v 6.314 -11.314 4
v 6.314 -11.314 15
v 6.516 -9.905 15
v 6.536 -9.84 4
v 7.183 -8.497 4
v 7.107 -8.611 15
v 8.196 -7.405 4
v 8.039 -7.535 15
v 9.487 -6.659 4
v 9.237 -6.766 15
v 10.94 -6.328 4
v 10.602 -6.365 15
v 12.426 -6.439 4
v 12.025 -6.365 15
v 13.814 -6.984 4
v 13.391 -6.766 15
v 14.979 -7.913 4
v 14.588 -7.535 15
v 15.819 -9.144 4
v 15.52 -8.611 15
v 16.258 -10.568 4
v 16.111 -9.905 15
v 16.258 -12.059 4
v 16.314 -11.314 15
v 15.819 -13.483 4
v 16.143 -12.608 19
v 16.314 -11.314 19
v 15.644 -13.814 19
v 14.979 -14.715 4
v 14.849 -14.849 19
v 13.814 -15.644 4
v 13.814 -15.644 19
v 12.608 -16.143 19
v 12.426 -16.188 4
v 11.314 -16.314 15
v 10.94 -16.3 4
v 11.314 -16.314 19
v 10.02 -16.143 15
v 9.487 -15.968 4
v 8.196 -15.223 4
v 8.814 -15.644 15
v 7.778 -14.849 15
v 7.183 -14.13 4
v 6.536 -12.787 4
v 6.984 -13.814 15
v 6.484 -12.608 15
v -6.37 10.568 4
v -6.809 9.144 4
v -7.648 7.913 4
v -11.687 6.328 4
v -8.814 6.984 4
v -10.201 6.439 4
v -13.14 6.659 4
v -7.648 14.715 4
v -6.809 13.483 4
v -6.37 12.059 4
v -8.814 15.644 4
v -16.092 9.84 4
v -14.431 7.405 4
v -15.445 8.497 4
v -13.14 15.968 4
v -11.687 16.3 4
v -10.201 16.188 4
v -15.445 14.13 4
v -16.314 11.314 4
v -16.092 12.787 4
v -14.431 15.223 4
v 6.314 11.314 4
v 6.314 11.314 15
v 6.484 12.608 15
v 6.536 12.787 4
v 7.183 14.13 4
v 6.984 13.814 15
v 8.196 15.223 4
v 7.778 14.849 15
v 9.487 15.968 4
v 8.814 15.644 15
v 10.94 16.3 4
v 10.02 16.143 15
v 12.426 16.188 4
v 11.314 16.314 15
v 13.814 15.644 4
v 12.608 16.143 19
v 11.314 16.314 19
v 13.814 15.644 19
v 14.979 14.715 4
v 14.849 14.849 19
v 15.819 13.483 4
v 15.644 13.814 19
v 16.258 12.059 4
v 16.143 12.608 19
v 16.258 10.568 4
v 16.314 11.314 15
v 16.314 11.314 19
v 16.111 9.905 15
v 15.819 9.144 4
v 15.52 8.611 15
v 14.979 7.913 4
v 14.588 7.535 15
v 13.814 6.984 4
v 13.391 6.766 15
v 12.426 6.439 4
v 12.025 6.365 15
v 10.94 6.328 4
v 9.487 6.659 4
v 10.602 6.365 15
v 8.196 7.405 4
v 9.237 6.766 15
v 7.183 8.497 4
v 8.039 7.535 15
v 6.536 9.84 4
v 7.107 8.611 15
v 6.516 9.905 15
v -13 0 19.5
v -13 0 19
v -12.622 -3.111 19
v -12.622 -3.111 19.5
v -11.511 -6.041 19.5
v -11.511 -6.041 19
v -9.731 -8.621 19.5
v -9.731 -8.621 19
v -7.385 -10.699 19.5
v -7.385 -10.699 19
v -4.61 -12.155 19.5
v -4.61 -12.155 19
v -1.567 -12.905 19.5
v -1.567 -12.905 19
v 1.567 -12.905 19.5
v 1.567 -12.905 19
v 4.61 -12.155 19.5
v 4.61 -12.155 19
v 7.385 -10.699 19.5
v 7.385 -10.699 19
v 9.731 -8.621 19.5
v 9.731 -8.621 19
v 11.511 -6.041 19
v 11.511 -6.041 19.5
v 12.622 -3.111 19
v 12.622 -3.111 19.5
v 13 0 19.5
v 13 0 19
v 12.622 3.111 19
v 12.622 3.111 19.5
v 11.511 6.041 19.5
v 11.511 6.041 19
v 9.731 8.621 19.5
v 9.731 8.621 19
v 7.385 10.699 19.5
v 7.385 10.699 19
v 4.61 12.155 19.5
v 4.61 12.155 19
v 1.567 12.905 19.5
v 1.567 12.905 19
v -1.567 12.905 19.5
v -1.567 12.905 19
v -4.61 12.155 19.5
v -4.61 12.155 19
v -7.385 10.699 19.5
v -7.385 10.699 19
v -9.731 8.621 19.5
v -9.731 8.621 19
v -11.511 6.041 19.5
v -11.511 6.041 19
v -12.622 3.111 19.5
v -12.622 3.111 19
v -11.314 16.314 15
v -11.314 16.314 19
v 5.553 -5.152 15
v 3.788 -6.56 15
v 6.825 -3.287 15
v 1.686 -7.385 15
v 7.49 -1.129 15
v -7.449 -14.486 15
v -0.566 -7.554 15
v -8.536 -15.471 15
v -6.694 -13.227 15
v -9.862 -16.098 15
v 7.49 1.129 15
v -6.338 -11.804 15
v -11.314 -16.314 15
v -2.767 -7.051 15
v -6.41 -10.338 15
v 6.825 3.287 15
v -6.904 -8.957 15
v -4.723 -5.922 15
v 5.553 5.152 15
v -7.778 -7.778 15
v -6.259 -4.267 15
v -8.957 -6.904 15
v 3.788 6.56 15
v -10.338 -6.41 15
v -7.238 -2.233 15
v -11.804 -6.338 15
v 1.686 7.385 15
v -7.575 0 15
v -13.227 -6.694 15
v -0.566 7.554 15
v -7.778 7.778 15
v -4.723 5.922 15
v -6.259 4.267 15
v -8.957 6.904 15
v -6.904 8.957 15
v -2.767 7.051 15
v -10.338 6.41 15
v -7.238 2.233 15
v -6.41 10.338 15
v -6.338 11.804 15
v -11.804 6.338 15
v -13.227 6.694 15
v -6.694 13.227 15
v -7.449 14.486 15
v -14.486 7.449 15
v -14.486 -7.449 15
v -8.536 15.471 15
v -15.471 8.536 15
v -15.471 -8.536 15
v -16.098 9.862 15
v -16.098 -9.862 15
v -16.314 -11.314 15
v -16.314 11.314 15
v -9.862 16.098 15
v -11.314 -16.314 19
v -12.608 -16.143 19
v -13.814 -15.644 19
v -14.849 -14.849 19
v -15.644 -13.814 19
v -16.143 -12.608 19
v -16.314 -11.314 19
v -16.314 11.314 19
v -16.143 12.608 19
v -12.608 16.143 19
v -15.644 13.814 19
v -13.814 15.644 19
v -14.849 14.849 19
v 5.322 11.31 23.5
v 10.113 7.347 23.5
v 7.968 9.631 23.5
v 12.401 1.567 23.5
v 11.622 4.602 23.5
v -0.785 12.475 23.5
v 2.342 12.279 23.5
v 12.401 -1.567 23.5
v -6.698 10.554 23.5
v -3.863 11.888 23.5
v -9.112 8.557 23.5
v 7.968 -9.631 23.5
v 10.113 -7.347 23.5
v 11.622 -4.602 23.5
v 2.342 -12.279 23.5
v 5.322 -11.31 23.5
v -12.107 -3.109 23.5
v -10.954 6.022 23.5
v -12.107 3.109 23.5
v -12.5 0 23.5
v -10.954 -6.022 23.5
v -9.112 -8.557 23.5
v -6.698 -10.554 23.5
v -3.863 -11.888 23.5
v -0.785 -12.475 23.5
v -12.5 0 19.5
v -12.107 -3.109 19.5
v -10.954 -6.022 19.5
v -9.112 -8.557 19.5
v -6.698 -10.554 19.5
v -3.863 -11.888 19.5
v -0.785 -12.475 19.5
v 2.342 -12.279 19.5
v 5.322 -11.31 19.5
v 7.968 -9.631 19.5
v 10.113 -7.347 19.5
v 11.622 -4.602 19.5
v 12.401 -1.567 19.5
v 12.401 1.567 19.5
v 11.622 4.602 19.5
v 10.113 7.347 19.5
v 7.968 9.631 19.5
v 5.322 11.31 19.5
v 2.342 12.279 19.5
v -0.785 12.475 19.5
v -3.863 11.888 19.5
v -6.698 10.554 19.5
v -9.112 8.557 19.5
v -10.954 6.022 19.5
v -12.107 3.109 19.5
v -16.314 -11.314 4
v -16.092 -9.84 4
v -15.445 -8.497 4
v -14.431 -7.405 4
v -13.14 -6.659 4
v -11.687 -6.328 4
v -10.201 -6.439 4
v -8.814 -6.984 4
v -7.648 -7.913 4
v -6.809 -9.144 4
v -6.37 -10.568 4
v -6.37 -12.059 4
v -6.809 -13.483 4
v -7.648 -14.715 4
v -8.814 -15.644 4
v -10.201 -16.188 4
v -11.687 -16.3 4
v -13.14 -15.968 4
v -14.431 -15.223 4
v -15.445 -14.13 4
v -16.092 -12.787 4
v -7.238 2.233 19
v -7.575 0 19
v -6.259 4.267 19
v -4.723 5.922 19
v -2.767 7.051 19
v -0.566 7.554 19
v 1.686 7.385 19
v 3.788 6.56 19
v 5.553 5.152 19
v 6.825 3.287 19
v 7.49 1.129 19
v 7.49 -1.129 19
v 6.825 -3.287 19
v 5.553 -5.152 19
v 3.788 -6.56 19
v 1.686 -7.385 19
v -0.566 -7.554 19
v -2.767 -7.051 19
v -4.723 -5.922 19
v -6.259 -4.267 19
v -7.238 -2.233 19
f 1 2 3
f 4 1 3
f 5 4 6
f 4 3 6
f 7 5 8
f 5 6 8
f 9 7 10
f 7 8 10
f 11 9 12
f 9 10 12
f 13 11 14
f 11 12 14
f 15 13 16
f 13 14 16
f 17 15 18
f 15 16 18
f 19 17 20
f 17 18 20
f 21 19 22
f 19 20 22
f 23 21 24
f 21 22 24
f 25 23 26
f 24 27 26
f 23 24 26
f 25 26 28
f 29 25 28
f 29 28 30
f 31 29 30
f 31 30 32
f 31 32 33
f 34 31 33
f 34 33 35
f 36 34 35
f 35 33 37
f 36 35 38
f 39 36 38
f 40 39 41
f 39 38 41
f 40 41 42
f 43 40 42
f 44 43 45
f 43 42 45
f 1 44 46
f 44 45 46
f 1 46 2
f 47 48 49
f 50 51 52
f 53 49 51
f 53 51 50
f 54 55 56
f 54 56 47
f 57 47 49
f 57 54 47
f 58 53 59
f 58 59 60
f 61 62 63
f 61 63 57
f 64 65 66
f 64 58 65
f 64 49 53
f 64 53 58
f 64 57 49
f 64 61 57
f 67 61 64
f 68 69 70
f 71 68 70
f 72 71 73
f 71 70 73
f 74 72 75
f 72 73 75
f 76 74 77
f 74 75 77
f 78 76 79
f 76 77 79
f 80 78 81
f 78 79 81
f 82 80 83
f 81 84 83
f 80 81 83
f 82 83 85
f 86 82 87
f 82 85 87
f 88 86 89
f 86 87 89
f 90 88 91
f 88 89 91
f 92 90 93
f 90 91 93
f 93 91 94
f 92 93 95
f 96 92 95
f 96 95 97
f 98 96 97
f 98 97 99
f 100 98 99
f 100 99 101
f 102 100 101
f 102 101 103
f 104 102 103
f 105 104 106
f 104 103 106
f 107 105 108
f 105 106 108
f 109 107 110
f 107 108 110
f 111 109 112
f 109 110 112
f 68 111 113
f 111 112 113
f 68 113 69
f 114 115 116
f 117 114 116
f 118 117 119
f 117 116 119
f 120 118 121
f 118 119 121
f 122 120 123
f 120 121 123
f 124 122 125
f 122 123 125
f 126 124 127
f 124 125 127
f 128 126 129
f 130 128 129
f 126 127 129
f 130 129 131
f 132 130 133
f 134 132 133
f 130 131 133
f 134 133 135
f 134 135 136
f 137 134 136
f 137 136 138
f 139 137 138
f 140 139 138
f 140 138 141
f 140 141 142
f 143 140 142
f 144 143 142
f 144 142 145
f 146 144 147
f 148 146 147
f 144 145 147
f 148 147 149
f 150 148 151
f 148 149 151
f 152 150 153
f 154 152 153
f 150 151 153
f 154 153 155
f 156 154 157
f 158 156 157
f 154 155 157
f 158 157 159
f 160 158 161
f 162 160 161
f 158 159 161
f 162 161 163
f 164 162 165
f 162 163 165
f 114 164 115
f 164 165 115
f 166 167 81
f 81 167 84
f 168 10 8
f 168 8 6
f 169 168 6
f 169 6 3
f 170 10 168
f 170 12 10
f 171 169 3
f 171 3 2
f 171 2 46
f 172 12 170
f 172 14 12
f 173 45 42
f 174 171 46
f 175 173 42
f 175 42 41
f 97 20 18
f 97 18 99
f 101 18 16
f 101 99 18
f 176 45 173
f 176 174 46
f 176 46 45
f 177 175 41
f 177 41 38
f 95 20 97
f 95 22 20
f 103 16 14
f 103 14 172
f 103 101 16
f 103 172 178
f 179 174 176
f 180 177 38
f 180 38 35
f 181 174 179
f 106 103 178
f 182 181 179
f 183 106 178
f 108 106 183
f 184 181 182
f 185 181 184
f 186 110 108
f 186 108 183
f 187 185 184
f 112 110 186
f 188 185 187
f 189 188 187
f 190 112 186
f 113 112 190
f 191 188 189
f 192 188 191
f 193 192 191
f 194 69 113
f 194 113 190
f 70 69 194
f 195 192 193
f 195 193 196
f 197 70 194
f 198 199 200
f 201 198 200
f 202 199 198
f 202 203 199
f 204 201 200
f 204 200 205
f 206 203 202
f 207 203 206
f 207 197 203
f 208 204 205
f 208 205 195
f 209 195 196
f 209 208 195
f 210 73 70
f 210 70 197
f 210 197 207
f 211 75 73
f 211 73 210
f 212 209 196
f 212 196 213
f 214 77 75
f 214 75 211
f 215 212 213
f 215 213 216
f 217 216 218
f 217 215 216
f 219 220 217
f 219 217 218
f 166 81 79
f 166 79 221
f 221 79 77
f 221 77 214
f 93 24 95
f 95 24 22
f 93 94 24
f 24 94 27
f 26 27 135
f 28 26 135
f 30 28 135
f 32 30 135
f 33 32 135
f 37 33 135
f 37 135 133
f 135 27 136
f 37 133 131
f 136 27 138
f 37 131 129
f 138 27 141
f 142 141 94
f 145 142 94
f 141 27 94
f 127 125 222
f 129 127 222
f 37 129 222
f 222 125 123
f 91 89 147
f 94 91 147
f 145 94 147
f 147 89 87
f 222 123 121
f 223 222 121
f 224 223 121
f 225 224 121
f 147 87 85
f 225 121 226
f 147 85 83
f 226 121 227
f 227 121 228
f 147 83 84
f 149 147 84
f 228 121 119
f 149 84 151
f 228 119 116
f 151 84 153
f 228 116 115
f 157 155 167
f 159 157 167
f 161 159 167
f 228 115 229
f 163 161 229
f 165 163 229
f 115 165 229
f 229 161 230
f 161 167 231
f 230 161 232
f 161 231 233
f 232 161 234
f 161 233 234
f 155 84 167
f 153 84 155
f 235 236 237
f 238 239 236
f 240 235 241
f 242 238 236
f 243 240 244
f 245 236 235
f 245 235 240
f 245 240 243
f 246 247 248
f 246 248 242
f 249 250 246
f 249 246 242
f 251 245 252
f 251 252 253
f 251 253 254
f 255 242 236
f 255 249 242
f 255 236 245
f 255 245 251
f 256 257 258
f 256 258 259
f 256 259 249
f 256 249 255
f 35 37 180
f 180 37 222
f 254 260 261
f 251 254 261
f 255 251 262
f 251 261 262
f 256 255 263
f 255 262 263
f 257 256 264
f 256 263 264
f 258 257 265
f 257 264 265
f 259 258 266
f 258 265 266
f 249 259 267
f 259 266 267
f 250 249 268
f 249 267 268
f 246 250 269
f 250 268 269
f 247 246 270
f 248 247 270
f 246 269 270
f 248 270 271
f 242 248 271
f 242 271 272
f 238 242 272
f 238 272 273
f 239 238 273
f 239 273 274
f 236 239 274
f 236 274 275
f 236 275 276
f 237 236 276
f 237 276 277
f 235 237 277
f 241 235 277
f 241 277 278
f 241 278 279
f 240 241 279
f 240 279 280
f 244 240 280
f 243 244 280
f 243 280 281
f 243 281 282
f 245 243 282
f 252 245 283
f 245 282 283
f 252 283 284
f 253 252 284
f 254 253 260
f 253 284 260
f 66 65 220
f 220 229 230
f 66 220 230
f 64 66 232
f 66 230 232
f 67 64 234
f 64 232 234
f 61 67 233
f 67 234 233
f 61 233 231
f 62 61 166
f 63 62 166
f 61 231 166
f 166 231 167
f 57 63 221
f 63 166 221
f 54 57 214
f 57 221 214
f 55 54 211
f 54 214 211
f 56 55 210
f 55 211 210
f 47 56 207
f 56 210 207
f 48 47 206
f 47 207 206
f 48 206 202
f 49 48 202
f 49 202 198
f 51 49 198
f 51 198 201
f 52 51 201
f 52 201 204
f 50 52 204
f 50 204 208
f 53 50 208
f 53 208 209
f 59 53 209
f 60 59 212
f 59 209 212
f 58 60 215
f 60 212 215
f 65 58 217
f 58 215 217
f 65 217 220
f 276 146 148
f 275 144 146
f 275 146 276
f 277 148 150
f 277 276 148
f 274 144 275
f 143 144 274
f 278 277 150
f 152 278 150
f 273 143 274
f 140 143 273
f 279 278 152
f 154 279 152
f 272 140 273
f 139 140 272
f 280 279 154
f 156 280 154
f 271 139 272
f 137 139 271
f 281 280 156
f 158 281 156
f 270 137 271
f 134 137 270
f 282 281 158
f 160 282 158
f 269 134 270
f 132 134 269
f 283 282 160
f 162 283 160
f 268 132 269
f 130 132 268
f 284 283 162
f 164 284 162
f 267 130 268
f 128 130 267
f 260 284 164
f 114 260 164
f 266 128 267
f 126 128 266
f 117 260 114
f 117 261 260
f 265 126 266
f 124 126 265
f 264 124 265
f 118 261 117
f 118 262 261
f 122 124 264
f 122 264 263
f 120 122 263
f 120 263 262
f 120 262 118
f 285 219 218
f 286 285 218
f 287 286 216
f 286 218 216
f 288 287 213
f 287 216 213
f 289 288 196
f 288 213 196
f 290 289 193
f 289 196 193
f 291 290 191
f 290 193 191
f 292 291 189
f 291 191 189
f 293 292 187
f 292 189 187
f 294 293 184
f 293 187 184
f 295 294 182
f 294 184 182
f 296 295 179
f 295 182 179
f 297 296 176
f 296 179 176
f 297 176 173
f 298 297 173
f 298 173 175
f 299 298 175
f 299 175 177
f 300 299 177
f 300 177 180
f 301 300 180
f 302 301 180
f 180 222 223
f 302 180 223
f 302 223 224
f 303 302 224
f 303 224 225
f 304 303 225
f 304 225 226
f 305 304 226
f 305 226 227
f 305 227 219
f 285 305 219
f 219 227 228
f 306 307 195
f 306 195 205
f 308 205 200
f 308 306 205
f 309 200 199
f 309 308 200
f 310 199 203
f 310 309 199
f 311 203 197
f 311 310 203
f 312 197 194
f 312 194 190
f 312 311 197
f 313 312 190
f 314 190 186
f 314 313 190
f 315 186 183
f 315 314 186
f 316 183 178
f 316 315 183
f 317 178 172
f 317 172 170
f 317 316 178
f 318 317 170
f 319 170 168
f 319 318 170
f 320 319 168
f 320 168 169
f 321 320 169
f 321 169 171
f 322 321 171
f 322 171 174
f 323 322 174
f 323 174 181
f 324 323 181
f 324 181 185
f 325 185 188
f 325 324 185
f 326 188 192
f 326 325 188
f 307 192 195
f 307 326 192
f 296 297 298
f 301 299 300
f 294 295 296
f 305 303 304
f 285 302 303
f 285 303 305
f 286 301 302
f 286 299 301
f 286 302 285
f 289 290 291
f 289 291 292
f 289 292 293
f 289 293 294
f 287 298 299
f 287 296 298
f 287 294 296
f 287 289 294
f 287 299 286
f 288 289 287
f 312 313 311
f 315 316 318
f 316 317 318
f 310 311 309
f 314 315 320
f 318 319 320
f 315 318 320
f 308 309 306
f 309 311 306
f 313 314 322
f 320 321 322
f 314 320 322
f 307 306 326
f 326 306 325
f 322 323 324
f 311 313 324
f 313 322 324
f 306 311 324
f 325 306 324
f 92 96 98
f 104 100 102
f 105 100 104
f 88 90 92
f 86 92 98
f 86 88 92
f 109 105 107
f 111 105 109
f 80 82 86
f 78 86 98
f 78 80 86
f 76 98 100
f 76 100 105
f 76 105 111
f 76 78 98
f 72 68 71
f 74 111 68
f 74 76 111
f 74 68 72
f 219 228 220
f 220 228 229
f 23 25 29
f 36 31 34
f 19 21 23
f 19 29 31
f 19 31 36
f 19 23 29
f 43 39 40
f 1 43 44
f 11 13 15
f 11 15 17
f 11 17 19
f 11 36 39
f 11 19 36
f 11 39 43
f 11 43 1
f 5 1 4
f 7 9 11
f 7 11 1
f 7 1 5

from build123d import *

# Parameters (mm, degrees)
SKETCH3_R             = 5
BOSS_EXTRUDE1_DEPTH   = 15
BOSS_EXTRUDE1_2_DEPTH = 15
BOSS_EXTRUDE1_3_DEPTH = 15
BOSS_EXTRUDE1_4_DEPTH = 15
SKETCH4_R             = 7.575
BOSS_EXTRUDE2_DEPTH   = 4
SKETCH5_R             = 12.5
BOSS_EXTRUDE3_DEPTH   = 4.5
SKETCH6_R             = 13
SKETCH6_R_2           = 12.5
BOSS_EXTRUDE4_DEPTH   = 0.5


with BuildPart() as part:
    # Sketch3 → Boss-Extrude1 (new body)
    with BuildSketch(Plane(origin=(0, 0, 19), x_dir=(-1, 0, 0), z_dir=(0, 0, -1))):
        with Locations((-11.313708499, 11.313708499)):
            Circle(SKETCH3_R)
    extrude(amount=BOSS_EXTRUDE1_DEPTH)



with BuildPart() as body_2:
    # Sketch3 → Boss-Extrude1 2 (new body)
    with BuildSketch(Plane(origin=(0, 0, 19), x_dir=(-1, 0, 0), z_dir=(0, 0, -1))):
        with Locations((11.313708499, 11.313708499)):
            Circle(SKETCH3_R)
    extrude(amount=BOSS_EXTRUDE1_2_DEPTH)


with BuildPart() as body_3:
    # Sketch3 → Boss-Extrude1 3 (new body)
    with BuildSketch(Plane(origin=(0, 0, 19), x_dir=(-1, 0, 0), z_dir=(0, 0, -1))):
        with Locations((11.313708499, -11.313708499)):
            Circle(SKETCH3_R)
    extrude(amount=BOSS_EXTRUDE1_3_DEPTH)


with BuildPart() as body_4:
    # Sketch3 → Boss-Extrude1 4 (new body)
    with BuildSketch(Plane(origin=(0, 0, 19), x_dir=(-1, 0, 0), z_dir=(0, 0, -1))):
        with Locations((-11.313708499, -11.313708499)):
            Circle(SKETCH3_R)
    extrude(amount=BOSS_EXTRUDE1_4_DEPTH)


with BuildPart() as part_1:
    add(part.part)

    add(body_2.part)  # Boss-Extrude2 merges body 2

    add(body_3.part)  # Boss-Extrude2 merges body 3

    add(body_4.part)  # Boss-Extrude2 merges body 4
    # Sketch4 → Boss-Extrude2 (add)
    with BuildSketch(Plane(origin=(0, 0, 19), x_dir=(-1, 0, 0), z_dir=(0, 0, -1))):
        with BuildLine():
            Line((16.313708499, -11.313708499), (16.313708499, 11.313708499))
            ThreePointArc((16.313708499, 11.313708499), (7.778174593, 7.778174593), (11.313708499, 16.313708499))
            Line((11.313708499, 16.313708499), (-11.313708499, 16.313708499))
            ThreePointArc((-11.313708499, 16.313708499), (-7.778174593, 14.849242405), (-6.313708499, 11.313708499))
            ThreePointArc((-6.313708499, 11.313708499), (-11.313708499, 6.313708499), (-16.313708499, 11.313708499))
            Line((-16.313708499, 11.313708499), (-16.313708499, -11.313708499))
            ThreePointArc((-16.313708499, -11.313708499), (-11.313708499, -6.313708499), (-6.313708499, -11.313708499))
            ThreePointArc((-6.313708499, -11.313708499), (-7.778174593, -14.849242405), (-11.313708499, -16.313708499))
            Line((-11.313708499, -16.313708499), (11.313708499, -16.313708499))
            ThreePointArc((11.313708499, -16.313708499), (7.778174593, -7.778174593), (16.313708499, -11.313708499))
        make_face()
        Circle(SKETCH4_R, mode=Mode.SUBTRACT)
    extrude(amount=BOSS_EXTRUDE2_DEPTH)

    # Sketch5 → Boss-Extrude3 (add)
    with BuildSketch(Plane.XY.offset(19)):
        with Locations(Location((0, 0, 0), (0, 0, 180))):
            Circle(SKETCH5_R)
    extrude(amount=BOSS_EXTRUDE3_DEPTH)

    # Sketch6 → Boss-Extrude4 (add)
    with BuildSketch(Plane.XY.offset(19)):
        with Locations(Location((0, 0, 0), (0, 0, 180))):
            Circle(SKETCH6_R)
        Circle(SKETCH6_R_2, mode=Mode.SUBTRACT)
    extrude(amount=BOSS_EXTRUDE4_DEPTH)


solid = part_1.part
